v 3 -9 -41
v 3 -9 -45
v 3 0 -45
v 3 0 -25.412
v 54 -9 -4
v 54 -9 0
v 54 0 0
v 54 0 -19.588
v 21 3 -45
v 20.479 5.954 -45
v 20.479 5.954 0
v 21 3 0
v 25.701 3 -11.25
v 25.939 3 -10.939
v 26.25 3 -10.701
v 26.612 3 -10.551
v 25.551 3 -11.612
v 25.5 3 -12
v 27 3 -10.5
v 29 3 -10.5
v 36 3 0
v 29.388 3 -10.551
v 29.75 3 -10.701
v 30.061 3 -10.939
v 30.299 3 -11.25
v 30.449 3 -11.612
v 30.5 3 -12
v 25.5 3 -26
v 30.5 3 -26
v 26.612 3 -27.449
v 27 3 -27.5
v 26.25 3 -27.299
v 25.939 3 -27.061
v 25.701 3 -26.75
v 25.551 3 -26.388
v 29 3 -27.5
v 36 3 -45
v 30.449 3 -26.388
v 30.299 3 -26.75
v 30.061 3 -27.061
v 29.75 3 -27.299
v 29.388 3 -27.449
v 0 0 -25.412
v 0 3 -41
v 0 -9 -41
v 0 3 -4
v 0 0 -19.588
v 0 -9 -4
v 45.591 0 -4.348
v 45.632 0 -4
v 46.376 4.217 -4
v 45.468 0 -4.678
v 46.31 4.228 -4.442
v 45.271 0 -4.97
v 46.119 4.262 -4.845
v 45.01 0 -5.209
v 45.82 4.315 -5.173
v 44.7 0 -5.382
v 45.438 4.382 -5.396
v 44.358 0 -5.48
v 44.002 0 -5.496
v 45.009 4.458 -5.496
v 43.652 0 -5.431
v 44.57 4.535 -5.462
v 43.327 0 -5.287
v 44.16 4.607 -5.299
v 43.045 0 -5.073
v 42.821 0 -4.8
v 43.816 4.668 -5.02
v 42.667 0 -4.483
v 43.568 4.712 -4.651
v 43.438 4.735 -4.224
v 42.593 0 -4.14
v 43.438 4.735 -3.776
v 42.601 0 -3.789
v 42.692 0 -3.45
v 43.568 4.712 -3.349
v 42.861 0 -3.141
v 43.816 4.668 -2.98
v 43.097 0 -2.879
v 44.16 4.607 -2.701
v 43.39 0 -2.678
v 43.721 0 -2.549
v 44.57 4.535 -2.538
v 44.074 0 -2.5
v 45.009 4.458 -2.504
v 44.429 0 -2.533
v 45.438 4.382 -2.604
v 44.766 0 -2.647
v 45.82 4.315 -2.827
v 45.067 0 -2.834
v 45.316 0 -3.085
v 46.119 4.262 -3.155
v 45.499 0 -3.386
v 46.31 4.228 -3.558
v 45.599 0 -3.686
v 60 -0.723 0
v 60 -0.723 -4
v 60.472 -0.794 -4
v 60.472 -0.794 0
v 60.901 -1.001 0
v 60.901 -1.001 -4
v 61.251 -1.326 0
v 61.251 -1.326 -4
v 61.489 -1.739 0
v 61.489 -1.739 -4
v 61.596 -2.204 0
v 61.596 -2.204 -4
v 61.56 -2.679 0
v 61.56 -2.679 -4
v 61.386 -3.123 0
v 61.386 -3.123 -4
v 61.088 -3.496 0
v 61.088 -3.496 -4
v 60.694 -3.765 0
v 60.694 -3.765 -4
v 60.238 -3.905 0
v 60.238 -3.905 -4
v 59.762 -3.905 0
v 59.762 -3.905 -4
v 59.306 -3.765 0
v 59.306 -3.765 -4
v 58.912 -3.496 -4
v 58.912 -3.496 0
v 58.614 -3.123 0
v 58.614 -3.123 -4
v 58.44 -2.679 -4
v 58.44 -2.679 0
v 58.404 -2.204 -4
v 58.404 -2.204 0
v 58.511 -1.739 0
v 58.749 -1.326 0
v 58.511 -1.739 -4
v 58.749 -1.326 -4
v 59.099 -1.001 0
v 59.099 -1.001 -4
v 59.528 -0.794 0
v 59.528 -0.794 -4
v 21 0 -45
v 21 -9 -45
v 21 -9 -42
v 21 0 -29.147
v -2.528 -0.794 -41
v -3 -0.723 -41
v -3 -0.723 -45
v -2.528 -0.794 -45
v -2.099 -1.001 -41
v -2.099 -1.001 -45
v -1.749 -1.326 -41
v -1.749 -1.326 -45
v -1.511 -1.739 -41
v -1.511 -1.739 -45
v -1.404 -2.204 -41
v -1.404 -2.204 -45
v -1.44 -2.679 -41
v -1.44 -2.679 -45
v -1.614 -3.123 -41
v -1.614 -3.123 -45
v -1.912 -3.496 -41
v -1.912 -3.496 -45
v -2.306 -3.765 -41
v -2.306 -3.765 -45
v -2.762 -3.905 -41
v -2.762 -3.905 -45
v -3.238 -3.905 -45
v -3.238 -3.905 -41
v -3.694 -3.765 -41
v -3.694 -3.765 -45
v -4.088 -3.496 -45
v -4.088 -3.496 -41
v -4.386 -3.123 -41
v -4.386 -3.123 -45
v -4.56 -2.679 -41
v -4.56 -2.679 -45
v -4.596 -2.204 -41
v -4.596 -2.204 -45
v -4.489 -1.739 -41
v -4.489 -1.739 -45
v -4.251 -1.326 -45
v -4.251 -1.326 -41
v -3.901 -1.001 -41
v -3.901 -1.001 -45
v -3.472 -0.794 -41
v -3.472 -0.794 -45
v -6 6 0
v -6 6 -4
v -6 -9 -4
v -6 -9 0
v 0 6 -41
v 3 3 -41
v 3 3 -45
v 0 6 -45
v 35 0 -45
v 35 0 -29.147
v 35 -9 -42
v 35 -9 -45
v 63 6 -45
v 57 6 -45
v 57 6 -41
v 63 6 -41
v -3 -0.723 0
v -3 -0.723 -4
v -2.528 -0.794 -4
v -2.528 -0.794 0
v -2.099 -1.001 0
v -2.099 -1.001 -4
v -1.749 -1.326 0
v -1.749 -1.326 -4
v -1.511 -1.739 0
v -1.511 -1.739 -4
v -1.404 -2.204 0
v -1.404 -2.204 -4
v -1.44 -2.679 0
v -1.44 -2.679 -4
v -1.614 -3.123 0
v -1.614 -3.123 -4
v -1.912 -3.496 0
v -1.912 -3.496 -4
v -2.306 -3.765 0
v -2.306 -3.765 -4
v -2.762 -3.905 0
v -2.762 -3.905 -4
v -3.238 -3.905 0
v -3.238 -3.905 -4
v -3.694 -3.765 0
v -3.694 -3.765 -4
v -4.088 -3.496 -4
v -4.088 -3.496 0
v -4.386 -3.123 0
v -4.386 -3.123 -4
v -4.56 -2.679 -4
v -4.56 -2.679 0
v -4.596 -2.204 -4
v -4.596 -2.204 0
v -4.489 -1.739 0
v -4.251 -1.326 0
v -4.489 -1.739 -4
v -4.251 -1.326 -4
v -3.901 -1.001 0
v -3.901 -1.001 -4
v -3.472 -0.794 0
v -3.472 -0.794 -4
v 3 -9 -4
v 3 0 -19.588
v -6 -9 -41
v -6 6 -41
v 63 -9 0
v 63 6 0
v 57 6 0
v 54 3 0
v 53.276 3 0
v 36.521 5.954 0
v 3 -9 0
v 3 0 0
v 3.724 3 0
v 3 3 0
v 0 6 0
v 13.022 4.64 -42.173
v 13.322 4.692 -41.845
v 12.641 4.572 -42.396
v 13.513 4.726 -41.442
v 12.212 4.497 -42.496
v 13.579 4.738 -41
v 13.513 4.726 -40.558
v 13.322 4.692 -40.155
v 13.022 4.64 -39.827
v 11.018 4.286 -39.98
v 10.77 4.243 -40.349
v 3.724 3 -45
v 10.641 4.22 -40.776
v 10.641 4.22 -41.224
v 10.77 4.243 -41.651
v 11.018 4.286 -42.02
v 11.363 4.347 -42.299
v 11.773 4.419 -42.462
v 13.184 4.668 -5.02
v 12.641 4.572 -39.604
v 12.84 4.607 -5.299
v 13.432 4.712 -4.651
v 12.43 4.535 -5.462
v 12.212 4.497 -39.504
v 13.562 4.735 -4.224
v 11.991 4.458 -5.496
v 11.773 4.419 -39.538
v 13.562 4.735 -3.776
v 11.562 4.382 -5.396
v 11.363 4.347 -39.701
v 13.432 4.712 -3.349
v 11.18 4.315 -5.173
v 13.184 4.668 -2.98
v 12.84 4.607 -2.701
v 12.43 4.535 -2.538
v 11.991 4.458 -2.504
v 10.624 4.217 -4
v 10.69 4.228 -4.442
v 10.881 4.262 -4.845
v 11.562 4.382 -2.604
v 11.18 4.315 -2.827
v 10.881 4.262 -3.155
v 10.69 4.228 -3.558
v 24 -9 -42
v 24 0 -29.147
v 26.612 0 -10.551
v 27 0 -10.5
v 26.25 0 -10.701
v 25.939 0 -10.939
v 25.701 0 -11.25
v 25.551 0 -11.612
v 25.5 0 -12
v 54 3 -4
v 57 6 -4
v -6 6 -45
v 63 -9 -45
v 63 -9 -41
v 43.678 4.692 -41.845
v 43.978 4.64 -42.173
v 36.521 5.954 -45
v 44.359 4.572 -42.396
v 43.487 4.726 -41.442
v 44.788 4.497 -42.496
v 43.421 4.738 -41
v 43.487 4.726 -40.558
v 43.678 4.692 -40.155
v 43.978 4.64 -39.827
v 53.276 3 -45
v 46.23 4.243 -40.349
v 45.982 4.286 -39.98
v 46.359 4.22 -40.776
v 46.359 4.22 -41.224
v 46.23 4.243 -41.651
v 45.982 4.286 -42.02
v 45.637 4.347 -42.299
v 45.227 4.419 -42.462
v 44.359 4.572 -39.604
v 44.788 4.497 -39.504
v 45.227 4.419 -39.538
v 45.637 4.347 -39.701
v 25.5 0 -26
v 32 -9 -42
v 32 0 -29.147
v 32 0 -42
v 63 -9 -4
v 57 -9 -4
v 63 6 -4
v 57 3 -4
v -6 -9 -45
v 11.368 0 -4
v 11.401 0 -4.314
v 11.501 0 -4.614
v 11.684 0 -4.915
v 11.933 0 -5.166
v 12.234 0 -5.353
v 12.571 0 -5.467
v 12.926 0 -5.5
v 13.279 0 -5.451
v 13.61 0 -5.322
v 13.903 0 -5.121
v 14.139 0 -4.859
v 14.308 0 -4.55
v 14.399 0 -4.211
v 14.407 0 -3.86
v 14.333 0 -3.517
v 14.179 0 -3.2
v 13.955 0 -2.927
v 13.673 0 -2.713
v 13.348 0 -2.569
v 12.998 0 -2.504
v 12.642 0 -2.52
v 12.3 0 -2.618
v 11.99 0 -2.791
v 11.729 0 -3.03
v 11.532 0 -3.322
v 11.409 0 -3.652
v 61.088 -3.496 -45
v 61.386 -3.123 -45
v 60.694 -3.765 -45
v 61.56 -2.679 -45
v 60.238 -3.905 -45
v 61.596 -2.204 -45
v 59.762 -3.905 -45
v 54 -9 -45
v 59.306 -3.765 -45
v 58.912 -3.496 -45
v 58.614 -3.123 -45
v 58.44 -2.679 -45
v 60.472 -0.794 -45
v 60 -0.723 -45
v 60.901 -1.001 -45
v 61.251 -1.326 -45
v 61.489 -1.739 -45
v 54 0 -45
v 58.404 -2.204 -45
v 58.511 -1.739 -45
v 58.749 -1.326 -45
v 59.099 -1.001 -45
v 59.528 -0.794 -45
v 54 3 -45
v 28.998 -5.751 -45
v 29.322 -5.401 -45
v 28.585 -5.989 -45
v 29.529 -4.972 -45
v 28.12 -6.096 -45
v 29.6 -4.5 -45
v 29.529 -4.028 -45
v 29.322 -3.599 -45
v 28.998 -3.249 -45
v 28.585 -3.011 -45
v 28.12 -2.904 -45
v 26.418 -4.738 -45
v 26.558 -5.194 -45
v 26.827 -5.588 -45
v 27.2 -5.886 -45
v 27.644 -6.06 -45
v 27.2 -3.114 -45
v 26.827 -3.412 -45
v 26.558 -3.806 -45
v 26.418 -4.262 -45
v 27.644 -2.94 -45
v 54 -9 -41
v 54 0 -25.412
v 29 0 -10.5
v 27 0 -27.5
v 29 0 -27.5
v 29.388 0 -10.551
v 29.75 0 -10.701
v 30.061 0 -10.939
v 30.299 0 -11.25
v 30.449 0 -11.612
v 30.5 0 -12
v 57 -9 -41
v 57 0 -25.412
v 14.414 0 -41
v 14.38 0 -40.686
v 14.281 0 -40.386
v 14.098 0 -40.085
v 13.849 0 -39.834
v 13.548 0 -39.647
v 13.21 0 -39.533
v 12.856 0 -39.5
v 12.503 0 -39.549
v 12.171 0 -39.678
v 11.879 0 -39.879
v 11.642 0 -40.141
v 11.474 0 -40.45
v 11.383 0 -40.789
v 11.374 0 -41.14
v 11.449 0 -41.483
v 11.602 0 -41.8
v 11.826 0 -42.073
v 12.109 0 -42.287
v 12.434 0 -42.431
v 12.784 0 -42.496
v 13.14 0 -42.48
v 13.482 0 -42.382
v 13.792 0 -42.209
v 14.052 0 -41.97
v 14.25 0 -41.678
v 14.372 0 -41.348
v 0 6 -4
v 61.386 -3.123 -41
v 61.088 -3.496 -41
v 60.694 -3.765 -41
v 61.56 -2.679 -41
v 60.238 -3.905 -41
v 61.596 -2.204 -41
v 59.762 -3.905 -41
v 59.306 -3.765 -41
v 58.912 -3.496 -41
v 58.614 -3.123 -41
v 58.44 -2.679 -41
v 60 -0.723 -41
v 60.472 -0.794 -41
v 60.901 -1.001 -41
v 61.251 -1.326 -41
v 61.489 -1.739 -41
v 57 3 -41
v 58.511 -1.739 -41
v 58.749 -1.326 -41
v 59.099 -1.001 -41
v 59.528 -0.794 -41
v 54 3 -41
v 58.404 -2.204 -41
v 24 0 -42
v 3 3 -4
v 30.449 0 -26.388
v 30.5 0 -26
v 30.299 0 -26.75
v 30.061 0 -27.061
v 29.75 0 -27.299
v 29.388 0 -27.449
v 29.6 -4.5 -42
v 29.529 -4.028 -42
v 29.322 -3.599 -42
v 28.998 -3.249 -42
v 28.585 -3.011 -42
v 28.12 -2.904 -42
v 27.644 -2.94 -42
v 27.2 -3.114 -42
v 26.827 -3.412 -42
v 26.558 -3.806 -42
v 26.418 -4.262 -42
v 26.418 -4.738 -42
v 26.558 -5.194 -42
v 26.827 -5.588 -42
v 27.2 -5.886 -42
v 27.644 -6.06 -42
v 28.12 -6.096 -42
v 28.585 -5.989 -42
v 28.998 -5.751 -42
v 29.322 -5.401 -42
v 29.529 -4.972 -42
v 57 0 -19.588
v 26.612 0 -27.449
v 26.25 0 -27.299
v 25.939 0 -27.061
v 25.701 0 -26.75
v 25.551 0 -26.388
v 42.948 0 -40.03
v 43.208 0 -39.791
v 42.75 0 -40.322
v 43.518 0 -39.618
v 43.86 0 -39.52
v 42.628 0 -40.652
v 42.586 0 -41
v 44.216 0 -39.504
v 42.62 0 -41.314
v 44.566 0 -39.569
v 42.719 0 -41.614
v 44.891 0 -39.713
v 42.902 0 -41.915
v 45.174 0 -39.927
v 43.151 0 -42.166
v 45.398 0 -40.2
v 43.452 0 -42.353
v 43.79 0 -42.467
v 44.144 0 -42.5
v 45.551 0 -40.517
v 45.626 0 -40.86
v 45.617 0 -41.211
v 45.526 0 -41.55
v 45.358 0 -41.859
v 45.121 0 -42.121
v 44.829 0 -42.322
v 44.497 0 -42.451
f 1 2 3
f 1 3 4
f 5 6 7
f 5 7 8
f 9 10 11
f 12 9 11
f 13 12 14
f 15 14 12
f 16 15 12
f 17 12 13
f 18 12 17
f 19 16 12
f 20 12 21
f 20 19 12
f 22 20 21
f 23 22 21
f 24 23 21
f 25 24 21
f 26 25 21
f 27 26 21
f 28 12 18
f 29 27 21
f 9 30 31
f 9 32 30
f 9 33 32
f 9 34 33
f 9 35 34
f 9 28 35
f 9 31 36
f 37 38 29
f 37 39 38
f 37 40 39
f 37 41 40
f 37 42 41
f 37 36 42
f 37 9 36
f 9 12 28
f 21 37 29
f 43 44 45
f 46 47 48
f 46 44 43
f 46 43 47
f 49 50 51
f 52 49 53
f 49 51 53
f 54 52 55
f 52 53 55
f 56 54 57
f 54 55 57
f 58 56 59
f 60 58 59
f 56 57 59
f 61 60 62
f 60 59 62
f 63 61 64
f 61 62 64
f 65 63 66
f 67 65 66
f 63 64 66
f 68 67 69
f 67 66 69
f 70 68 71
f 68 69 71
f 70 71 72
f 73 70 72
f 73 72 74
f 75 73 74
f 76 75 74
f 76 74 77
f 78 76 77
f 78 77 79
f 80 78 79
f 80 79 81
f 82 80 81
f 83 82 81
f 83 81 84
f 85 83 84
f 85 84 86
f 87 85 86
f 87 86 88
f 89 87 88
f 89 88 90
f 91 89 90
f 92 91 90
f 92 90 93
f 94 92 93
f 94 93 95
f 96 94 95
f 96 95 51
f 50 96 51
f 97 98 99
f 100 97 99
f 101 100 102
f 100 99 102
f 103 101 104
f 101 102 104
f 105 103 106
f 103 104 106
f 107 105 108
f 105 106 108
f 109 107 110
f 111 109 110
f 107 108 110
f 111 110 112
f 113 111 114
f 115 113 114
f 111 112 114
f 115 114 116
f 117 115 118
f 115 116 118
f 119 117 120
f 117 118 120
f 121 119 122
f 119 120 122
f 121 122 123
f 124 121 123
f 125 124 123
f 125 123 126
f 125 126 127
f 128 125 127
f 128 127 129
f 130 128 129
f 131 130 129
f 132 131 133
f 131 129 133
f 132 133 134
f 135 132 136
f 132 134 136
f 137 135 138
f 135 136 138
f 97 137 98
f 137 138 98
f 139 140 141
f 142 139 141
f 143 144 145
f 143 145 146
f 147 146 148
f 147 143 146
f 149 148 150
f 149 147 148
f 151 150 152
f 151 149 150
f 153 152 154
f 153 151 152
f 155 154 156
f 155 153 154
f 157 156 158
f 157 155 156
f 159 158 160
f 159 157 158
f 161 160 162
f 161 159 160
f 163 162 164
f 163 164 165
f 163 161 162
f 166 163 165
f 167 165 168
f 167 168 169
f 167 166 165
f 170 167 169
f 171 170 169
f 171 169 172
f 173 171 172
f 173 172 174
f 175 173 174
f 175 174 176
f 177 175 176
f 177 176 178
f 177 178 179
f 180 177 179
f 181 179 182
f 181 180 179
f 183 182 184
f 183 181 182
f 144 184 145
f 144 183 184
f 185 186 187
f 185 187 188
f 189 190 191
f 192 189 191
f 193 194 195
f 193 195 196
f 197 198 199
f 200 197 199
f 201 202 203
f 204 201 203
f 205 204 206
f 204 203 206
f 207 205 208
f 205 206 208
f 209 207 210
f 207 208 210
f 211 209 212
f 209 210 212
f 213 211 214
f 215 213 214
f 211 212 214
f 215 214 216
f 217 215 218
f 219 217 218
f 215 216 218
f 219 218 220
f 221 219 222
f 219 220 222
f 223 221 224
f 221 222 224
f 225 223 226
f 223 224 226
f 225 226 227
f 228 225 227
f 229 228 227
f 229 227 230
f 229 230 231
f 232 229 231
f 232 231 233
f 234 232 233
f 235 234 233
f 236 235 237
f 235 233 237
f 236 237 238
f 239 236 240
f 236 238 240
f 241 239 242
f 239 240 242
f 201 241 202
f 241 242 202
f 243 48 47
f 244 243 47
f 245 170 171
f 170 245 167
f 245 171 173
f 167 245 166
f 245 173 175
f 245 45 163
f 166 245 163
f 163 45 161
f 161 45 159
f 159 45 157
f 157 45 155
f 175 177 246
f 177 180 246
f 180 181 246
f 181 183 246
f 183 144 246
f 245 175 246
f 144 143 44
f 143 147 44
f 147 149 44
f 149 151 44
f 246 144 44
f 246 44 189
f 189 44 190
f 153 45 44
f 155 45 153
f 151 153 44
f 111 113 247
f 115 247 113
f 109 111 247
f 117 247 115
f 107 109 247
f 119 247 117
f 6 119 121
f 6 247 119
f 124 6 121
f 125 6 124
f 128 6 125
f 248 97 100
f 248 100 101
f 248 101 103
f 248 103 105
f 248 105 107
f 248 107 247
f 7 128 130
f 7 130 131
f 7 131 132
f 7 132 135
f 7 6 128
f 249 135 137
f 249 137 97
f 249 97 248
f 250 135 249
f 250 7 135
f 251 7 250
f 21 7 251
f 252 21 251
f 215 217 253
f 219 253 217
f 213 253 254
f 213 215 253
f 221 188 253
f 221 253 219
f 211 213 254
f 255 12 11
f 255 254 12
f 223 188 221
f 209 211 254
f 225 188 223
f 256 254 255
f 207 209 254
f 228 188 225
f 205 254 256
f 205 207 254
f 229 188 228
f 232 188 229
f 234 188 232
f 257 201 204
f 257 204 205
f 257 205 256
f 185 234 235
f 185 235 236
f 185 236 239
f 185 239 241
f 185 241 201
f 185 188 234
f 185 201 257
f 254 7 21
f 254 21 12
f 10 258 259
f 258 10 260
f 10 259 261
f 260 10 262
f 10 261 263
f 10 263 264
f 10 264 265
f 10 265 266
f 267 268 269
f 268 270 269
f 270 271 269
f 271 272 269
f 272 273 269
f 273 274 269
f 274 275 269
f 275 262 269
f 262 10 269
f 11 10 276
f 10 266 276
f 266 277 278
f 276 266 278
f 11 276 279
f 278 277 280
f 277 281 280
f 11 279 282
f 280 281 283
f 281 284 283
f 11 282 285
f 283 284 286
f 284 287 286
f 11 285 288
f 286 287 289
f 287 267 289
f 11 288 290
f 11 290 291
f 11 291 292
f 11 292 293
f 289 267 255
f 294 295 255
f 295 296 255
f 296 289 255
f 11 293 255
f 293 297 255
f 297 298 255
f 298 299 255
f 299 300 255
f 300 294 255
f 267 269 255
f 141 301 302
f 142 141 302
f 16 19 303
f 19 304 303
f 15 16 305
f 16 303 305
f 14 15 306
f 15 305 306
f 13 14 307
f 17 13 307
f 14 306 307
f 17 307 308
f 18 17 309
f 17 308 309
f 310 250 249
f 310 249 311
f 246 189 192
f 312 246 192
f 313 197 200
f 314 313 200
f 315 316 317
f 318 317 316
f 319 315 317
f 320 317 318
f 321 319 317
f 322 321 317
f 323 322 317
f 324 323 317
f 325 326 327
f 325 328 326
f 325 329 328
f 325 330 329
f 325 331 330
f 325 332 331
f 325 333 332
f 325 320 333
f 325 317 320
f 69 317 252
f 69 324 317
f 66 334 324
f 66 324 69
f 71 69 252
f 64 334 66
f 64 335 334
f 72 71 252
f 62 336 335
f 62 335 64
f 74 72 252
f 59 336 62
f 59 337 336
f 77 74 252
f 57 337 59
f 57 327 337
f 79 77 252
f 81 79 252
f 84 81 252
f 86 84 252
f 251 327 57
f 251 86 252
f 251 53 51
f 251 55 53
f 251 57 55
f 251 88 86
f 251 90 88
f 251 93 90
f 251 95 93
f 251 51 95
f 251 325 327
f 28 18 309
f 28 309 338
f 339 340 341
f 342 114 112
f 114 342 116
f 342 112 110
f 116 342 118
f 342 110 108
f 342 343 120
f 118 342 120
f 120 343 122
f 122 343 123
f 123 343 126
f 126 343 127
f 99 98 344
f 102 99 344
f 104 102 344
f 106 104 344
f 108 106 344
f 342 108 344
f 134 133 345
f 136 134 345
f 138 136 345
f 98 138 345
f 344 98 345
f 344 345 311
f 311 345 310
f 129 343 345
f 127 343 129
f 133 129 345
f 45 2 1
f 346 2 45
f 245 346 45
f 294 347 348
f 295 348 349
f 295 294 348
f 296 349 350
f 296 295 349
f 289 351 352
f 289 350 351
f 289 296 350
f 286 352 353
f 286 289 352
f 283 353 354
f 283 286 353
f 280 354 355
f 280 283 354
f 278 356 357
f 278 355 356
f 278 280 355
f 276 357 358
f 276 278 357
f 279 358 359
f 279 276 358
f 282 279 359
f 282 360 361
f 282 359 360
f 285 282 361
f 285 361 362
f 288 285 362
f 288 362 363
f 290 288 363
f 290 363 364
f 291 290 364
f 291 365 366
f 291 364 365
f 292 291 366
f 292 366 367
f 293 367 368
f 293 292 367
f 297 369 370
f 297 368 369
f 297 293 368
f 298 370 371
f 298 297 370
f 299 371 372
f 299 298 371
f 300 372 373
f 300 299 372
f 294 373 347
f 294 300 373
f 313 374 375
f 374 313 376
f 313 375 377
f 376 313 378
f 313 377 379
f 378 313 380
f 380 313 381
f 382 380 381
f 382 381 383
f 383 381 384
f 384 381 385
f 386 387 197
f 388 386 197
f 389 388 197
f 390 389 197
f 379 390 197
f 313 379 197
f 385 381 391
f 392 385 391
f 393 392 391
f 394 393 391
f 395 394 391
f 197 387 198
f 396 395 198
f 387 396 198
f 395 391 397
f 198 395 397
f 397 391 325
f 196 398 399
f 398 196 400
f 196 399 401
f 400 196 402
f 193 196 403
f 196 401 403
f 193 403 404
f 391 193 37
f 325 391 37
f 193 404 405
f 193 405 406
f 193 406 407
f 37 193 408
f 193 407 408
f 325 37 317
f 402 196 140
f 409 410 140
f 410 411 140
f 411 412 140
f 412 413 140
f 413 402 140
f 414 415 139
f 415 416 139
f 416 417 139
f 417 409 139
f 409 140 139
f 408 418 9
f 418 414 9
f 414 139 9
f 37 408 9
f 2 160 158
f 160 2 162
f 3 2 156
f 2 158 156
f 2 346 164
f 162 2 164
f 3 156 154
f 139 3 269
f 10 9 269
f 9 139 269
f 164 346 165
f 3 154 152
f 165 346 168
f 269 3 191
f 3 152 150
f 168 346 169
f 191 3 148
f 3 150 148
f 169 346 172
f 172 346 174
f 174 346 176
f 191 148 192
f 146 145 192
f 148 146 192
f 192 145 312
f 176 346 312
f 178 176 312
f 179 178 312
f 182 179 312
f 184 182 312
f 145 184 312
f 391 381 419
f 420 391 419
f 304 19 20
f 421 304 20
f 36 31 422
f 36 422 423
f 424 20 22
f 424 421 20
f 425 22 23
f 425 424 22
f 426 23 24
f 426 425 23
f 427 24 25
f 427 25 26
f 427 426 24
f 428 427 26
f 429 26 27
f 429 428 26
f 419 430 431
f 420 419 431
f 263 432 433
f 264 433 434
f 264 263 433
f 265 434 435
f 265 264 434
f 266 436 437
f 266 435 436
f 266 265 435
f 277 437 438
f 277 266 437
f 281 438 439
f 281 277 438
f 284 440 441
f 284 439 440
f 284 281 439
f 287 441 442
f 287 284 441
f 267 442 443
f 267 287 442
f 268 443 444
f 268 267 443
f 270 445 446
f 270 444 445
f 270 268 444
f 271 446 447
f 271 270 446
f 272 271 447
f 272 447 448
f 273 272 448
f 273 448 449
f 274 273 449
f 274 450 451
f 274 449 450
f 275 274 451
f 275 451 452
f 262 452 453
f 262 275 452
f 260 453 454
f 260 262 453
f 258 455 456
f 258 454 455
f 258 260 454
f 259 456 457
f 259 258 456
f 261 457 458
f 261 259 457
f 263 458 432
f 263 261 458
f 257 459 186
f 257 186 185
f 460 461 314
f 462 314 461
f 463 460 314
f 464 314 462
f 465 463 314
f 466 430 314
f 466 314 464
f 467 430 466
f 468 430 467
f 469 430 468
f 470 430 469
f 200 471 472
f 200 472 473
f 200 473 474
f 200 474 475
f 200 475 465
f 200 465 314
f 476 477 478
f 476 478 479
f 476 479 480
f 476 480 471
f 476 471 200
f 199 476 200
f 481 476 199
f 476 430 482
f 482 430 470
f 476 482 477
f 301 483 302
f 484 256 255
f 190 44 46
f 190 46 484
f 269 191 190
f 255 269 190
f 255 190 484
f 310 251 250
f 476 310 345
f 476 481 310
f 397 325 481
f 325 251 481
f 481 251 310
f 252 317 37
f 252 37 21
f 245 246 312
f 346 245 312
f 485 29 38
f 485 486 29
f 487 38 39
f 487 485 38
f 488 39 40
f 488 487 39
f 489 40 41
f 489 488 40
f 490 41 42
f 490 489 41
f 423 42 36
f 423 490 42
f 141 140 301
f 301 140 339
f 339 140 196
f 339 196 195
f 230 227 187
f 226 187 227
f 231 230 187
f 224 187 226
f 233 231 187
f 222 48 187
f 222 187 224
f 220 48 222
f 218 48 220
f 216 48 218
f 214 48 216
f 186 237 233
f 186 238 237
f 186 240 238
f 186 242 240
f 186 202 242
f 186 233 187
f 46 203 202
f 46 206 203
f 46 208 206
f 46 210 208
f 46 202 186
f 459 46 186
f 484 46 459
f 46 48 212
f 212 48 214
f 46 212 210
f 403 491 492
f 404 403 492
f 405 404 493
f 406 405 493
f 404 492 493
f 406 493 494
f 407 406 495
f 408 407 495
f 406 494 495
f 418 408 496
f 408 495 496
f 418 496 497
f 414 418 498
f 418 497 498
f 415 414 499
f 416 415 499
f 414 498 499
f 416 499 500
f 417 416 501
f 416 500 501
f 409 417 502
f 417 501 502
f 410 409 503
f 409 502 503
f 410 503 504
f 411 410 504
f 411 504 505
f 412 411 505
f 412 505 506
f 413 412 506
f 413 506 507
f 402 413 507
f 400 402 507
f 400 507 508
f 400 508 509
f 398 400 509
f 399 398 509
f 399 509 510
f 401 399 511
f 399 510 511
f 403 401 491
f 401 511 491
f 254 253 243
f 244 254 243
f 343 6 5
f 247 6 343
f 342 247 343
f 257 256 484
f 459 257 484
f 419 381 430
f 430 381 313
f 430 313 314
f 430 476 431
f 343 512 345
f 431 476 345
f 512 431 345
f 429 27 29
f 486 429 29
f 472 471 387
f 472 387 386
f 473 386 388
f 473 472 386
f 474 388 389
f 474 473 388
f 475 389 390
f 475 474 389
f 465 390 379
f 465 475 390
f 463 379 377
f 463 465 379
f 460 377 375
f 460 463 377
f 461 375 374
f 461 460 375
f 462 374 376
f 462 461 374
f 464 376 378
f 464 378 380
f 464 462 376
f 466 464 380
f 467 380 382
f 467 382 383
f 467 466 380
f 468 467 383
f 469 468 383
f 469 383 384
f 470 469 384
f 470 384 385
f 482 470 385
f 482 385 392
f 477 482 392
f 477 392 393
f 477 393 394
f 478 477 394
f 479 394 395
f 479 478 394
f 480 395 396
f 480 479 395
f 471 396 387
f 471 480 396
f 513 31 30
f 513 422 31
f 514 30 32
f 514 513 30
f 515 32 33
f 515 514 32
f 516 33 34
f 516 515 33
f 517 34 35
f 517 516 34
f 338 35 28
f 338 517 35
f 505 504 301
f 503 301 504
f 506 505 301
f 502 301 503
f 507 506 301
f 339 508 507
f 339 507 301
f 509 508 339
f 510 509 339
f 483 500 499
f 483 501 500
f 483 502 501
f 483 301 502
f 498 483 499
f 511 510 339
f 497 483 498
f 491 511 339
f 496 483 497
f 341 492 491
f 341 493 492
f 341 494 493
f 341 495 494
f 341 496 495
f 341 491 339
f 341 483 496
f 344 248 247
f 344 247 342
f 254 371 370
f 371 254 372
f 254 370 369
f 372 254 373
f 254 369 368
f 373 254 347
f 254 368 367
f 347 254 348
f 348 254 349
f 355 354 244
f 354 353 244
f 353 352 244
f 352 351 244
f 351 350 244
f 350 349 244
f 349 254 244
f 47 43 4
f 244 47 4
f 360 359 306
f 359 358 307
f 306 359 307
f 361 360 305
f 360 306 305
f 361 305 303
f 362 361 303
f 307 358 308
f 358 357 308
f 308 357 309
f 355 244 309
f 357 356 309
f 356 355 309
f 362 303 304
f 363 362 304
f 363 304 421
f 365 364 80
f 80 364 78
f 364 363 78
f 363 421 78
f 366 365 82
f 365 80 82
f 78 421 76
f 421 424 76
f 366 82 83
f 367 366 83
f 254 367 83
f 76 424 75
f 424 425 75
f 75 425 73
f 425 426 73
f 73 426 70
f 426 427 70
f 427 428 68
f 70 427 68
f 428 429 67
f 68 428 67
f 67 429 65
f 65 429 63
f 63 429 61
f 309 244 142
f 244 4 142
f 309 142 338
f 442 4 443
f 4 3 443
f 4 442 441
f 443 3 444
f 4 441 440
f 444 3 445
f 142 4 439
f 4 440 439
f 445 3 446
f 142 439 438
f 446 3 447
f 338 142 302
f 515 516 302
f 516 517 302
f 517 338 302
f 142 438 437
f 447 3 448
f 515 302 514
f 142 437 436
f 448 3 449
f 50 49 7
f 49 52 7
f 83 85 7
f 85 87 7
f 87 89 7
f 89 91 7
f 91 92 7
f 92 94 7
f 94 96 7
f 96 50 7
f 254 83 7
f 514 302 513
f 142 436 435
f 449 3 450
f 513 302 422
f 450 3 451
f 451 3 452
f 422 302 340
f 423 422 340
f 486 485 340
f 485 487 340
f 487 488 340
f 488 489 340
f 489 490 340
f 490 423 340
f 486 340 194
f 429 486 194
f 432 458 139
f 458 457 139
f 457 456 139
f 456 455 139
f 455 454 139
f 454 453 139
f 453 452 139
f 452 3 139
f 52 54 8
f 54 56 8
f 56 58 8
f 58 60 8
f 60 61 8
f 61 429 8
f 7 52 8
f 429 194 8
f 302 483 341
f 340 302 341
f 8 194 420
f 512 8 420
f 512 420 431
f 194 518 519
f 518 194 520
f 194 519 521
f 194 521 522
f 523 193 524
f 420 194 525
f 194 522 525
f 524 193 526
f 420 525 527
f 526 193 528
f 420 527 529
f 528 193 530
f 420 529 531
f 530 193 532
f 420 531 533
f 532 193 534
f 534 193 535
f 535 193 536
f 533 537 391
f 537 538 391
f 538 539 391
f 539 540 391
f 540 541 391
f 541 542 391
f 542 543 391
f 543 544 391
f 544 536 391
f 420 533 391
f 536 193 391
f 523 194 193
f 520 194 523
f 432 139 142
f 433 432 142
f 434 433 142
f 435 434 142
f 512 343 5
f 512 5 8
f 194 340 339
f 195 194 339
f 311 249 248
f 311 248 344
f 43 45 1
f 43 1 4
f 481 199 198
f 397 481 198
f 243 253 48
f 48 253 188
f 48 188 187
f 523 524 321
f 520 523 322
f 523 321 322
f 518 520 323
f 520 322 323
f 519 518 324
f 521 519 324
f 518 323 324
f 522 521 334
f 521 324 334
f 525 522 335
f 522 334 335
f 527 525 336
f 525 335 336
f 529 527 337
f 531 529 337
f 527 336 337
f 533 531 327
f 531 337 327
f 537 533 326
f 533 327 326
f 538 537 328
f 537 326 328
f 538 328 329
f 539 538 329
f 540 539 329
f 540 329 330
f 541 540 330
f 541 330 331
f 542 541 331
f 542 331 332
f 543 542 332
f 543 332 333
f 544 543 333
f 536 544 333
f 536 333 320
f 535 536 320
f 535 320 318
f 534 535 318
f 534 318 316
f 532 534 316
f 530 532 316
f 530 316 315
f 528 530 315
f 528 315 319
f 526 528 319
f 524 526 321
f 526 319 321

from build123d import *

# Parameters (mm, degrees)
SKETCH_1_W                 = 57
SKETCH_1_H                 = 45
EXTRUDE_1_DEPTH            = 3
SKETCH_2_W                 = 4
SKETCH_2_H                 = 15
EXTRUDE_2_DEPTH            = 6
SKETCH_3_W                 = 4
SKETCH_3_H                 = 15
EXTRUDE_3_DEPTH            = 6
EXTRUDE_4_DEPTH            = 3
SKETCH_5_W                 = 4
SKETCH_5_H                 = 9
EXTRUDE_5_DEPTH            = 3
CHAMFER_1_SIZE             = 3
SKETCH_6_R                 = 1.6
CUT_EXTRUDE_1_DEPTH        = 4
SKETCH_8_W                 = 8
SKETCH_8_H                 = 3
EXTRUDE_6_DEPTH            = 9
EXTRUDE_7_DEPTH            = 3
EXTRUDE_8_DEPTH            = 3
SKETCH_11_R                = 1.6
CUT_EXTRUDE_3_DEPTH        = 3
SKETCH_12_W                = 5
SKETCH_12_H                = 17
CUT_EXTRUDE_4_DEPTH        = 3
FILLET_1_R                 = 1.5
EXTRUDE_9_REACH            = 80.57
SKETCH_15_W                = 45
SKETCH_15_H                = 17.726539555
SKETCH_16_R                = 1.5
CUT_EXTRUDE_5_DEPTH        = 79.570276896
CHAMFER_1_OF_MIRROR_2_SIZE = 3


with BuildPart() as part:
    # 草图1 → 凸台-拉伸1 (new body)
    with BuildSketch(Plane(origin=(0, 0, 0), x_dir=(1, 0, 0), z_dir=(0, 1, 0))):
        with Locations((28.5, 22.5)):
            Rectangle(SKETCH_1_W, SKETCH_1_H)
    extrude(amount=EXTRUDE_1_DEPTH)

    # 草图2 → 凸台-拉伸2 (add)
    with BuildSketch(Plane.ZY):
        with Locations((-2, -1.5)):
            Rectangle(SKETCH_2_W, SKETCH_2_H)
    extrude_2 = extrude(amount=EXTRUDE_2_DEPTH)

    # 草图3 → 凸台-拉伸3 (add)
    with BuildSketch(Plane(origin=(57, 0, 0), x_dir=(0, 0, -1), z_dir=(1, 0, 0))):
        with Locations((2, -1.5)):
            Rectangle(SKETCH_3_W, SKETCH_3_H)
    extrude_3 = extrude(amount=EXTRUDE_3_DEPTH)

    # 草图4 → 凸台-拉伸4 (add)
    with BuildSketch(Plane.ZY.offset(-57)):
        Polygon((-4, -9), (-19.588457268, 0), (0, 0), (0, -9), align=None)
    extrude_4 = extrude(amount=EXTRUDE_4_DEPTH)

    # 草图5 → 凸台-拉伸5 (add)
    with BuildSketch(Plane(origin=(0, 0, 0), x_dir=(0, 0, -1), z_dir=(1, 0, 0))):
        Polygon((19.588457268, 0), (4, 0), (4, -9), align=None)
        with Locations((2, -4.5)):
            Rectangle(SKETCH_5_W, SKETCH_5_H)
    extrude_5 = extrude(amount=EXTRUDE_5_DEPTH)

    # 倒角1
    chamfer_1_edges = [part.edges().sort_by_distance(p)[0] for p in [
        (0, 3, -2),
        (57, 3, -2),
    ]]
    chamfer(chamfer_1_edges, length=CHAMFER_1_SIZE - 0.0001)  # a hair under: the kernel refuses the full size

    # 草图6 → 切除-拉伸1 (cut)
    with BuildSketch(Plane(origin=(0, 0, -4), x_dir=(-1, 0, 0), z_dir=(0, 0, -1))):
        with Locations(Location((3, -2.323268139, 0), (0, 0, 90))):
            Circle(SKETCH_6_R)
        with Locations(Location((-60, -2.323268139, 0), (0, 0, 90))):
            Circle(SKETCH_6_R)
    cut_extrude_1 = extrude(amount=-CUT_EXTRUDE_1_DEPTH, mode=Mode.SUBTRACT)

    # 草图8 → 凸台-拉伸6 (add)
    with BuildSketch(Plane.XZ):
        with Locations((28, -43.5)):
            Rectangle(SKETCH_8_W, SKETCH_8_H)
    extrude(amount=EXTRUDE_6_DEPTH)

    # 草图9 → 凸台-拉伸7 (add)
    with BuildSketch(Plane(origin=(32, 0, 0), x_dir=(0, 0, -1), z_dir=(1, 0, 0))):
        Polygon((45, 0), (29.146667939, 0), (42, -9), (45, -9), align=None)
    extrude(amount=EXTRUDE_7_DEPTH)

    # 草图10 → 凸台-拉伸8 (add)
    with BuildSketch(Plane.ZY.offset(-24)):
        Polygon((-45, 0), (-45, -9), (-42, -9), (-29.146667939, 0), align=None)
    extrude(amount=EXTRUDE_8_DEPTH)

    # 草图11 → 切除-拉伸3 (cut)
    with BuildSketch(Plane.XY.offset(-42)):
        with Locations((28, -4.5)):
            Circle(SKETCH_11_R)
    extrude(amount=-CUT_EXTRUDE_3_DEPTH, mode=Mode.SUBTRACT)

    # 草图12 → 切除-拉伸4 (cut)
    with BuildSketch(Plane(origin=(0, 3, 0), x_dir=(1, 0, 0), z_dir=(0, 1, 0))):
        with Locations((28, 19)):
            Rectangle(SKETCH_12_W, SKETCH_12_H)
    extrude(amount=-CUT_EXTRUDE_4_DEPTH, mode=Mode.SUBTRACT)

    # 圆角1
    fillet_1_edges = [part.edges().sort_by_distance(p)[0] for p in [
        (25.5, 1.5, -27.5),
        (30.5, 1.5, -27.5),
        (30.5, 1.5, -10.5),
        (25.5, 1.5, -10.5),
    ]]
    fillet(fillet_1_edges, radius=FILLET_1_R)

    # 草图15 → 凸台-拉伸9 (add, up to next)
    with BuildSketch(Plane(origin=(2.119507574, 12.02032477, 0), x_dir=(0, 0, 1), z_dir=(0.17364817766693066, 0.9848077530122081, 0)), mode=Mode.PRIVATE) as extrude_9_sk1:
        with Locations((-22.5, 43.795404353)):
            Rectangle(SKETCH_15_W, SKETCH_15_H)
    extrude_9_tool1 = extrude(extrude_9_sk1.sketch, amount=-EXTRUDE_9_REACH, mode=Mode.PRIVATE) - part.part
    extrude_9 = extrude_9_tool1.solids().sort_by_distance((45.249561, 4.415333, -22.5))[0]
    add(extrude_9)

    # 草图16 → 切除-拉伸5 (cut, through all)
    with BuildSketch(Plane(origin=(2.119507574, 12.02032477, 0), x_dir=(0.9848077530122081, -0.17364817766693064, 0), z_dir=(0.17364817766693064, 0.9848077530122081, 0))):
        with Locations(Location((43.439057305, 41, 0), (0, 0, 180))):
            Circle(SKETCH_16_R)
        with Locations((43.439057305, 4)):
            Circle(SKETCH_16_R)
    cut_extrude_5 = extrude(amount=-CUT_EXTRUDE_5_DEPTH, mode=Mode.SUBTRACT)

    # 镜向1: 凸台-拉伸9, 切除-拉伸5 across plane
    add(extrude_9.mirror(Plane(origin=(28.5, 0, 0), x_dir=(0, 0, 1), z_dir=(1, 0, 0))))
    add(cut_extrude_5.mirror(Plane(origin=(28.5, 0, 0), x_dir=(0, 0, 1), z_dir=(1, 0, 0))), mode=Mode.SUBTRACT)

    # 镜向2: 凸台-拉伸2, 凸台-拉伸3, 凸台-拉伸4, 凸台-拉伸5, 切除-拉伸1 across plane
    add(extrude_2.mirror(Plane.XY.offset(-22.5)))
    add(extrude_3.mirror(Plane.XY.offset(-22.5)))
    add(extrude_4.mirror(Plane.XY.offset(-22.5)))
    add(extrude_5.mirror(Plane.XY.offset(-22.5)))
    add(cut_extrude_1.mirror(Plane.XY.offset(-22.5)), mode=Mode.SUBTRACT)

    # 倒角1 of 镜向2
    chamfer_1_of_mirror_2_edges = [part.edges().sort_by_distance(p)[0] for p in [
        (0, 3, -43),
        (57, 3, -43),
    ]]
    chamfer(chamfer_1_of_mirror_2_edges, length=CHAMFER_1_OF_MIRROR_2_SIZE - 0.0001)  # a hair under: the kernel refuses the full size


solid = part.part
